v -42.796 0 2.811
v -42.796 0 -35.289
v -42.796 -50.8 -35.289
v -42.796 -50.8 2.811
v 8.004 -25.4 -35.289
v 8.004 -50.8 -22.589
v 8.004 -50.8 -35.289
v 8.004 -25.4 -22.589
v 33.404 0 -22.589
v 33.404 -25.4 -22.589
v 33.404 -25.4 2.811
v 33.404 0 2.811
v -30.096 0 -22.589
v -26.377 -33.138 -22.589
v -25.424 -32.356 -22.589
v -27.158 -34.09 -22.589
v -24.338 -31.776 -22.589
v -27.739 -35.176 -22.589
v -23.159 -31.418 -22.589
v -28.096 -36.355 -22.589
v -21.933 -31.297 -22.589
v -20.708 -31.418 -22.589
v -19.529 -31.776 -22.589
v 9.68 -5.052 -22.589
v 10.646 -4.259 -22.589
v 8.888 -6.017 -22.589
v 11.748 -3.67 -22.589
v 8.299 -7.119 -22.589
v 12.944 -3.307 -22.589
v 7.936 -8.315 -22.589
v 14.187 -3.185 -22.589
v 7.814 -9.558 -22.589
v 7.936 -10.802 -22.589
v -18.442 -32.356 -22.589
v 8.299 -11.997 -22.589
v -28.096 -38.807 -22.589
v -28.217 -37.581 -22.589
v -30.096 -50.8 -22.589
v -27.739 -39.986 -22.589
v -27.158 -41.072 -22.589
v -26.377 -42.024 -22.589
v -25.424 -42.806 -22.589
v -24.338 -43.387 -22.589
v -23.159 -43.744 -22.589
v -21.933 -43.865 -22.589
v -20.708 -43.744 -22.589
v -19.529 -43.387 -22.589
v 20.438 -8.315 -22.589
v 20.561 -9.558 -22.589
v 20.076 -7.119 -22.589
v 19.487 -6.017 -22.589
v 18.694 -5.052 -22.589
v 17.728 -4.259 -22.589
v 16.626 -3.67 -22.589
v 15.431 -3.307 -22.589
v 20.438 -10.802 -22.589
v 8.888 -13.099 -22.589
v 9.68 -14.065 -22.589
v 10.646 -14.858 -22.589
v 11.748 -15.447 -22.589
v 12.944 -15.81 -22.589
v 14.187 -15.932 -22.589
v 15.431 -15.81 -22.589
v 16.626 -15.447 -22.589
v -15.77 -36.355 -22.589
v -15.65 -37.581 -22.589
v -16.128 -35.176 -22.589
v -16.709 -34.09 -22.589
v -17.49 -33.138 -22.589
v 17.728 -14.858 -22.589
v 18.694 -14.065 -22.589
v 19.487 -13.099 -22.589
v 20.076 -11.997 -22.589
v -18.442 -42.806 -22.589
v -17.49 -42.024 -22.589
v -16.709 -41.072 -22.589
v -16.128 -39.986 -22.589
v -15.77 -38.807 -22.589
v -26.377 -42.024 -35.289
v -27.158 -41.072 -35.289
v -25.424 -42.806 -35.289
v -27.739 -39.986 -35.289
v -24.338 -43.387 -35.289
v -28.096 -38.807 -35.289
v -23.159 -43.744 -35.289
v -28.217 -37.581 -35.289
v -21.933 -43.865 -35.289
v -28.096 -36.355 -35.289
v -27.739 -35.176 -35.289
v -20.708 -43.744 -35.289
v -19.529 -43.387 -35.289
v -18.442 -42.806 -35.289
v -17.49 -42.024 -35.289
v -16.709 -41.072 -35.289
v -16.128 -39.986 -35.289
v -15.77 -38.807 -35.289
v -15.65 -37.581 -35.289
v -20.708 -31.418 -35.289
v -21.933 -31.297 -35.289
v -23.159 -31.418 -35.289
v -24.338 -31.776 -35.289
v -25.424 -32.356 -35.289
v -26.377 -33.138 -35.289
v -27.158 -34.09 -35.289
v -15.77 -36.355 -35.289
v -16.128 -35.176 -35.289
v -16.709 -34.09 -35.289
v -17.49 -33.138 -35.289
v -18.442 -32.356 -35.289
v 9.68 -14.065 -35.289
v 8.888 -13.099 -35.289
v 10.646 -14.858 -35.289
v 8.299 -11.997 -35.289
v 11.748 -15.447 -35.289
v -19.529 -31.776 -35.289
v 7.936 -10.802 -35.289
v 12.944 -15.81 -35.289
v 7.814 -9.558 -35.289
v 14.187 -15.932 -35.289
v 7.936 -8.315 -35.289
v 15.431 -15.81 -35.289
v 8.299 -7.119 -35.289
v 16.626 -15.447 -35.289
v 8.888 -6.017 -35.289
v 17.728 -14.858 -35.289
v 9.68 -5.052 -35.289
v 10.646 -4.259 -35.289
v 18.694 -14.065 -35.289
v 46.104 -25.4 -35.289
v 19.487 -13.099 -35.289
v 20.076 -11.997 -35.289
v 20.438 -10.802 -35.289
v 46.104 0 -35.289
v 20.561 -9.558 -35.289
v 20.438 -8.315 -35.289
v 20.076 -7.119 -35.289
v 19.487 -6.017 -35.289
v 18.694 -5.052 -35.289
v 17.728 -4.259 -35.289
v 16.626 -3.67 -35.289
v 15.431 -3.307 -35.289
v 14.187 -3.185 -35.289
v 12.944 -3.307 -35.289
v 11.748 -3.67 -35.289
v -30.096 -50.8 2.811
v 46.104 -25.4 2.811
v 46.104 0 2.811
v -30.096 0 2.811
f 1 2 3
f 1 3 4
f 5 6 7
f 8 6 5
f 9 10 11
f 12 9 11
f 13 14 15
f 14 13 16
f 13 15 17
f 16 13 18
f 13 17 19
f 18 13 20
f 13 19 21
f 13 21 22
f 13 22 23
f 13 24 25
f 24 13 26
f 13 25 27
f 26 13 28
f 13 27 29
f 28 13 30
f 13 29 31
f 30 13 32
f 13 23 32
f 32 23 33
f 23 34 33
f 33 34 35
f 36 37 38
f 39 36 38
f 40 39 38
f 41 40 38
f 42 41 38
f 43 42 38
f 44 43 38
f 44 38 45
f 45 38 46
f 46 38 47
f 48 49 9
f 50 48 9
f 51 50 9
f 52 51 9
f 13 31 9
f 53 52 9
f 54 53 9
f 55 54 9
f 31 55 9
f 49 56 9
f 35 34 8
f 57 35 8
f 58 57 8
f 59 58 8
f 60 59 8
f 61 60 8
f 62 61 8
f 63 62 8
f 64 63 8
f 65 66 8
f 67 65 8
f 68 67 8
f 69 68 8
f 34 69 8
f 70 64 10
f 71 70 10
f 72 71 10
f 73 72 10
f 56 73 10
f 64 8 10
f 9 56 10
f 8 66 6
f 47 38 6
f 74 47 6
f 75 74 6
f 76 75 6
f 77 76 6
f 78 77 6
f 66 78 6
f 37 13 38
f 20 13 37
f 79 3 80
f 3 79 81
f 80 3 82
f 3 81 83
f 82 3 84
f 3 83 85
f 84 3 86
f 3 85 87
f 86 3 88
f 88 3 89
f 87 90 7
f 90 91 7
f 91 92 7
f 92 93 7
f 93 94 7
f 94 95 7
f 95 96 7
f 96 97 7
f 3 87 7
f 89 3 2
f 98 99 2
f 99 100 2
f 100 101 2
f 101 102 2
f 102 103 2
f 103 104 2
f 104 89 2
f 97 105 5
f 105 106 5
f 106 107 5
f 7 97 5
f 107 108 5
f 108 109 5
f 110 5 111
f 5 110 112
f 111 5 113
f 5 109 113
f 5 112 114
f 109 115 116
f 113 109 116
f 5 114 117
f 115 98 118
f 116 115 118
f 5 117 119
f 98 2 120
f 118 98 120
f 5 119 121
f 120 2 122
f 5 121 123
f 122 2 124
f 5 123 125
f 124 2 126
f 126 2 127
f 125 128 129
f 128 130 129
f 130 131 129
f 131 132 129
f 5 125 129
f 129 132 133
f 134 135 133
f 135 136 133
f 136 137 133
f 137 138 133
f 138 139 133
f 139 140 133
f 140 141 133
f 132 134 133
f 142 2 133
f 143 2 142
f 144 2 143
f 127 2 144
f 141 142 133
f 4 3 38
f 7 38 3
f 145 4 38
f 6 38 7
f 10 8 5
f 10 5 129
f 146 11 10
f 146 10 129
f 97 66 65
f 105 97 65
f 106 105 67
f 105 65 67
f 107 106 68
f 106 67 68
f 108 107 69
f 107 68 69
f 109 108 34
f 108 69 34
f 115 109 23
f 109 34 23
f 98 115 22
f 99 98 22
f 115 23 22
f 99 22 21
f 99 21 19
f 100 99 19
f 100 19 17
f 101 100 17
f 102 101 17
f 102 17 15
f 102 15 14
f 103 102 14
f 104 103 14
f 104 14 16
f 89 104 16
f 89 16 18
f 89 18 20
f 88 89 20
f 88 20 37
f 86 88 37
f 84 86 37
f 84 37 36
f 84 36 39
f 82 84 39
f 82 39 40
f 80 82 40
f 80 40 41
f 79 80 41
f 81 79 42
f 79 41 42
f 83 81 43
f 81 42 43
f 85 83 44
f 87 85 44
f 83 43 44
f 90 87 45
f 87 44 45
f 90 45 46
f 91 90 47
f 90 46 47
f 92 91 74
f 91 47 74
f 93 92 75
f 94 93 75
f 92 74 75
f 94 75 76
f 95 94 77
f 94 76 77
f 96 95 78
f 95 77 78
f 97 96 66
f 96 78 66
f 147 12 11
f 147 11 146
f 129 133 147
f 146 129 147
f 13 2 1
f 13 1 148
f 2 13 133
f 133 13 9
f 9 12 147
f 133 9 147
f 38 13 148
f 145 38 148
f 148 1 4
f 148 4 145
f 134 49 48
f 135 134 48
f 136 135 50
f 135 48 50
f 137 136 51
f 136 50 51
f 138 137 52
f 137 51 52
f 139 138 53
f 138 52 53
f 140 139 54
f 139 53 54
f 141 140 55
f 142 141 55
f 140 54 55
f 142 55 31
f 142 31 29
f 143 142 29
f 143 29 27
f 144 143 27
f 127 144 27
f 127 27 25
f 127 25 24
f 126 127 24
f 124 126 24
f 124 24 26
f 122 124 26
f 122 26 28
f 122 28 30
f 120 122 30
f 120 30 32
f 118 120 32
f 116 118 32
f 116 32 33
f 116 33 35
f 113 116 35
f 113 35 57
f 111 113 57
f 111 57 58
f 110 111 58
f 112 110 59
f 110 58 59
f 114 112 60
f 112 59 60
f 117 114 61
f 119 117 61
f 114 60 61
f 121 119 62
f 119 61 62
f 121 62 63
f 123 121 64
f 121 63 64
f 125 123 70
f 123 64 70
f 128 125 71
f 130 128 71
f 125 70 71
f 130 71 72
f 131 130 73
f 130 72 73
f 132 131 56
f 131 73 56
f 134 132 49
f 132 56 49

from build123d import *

# Parameters (mm, degrees)
F0_W      = 88.9
F0_H      = 38.1
F1_DEPTH  = 50.8
F2_W      = 63.5
F2_H      = 25.4
F3_DEPTH  = 50.8
F4_W      = 38.1
F4_H      = 25.4
F5_DEPTH  = 38.1
F6_W      = 12.7
F6_H      = 25.4
F7_DEPTH  = 38.1
F8_R      = 6.373614
F9_DEPTH  = 25.4
F10_R     = 6.283749
F11_DEPTH = 25.4


with BuildPart() as f1:
    # F0 (on Front) → F1 (new body)
    with BuildSketch(Plane.XZ):
        with Locations((1.654342, -16.239445)):
            Rectangle(F0_W, F0_H)
    extrude(amount=F1_DEPTH)

    # F2 (on face) → F3 (cut)
    with BuildSketch(Plane.XZ.offset(50.8)):
        with Locations((1.654342, -9.889445)):
            Rectangle(F2_W, F2_H)
    extrude(amount=-F3_DEPTH, mode=Mode.SUBTRACT)

    # F4 (on face) → F5 (cut)
    with BuildSketch(Plane.XY.offset(-22.589445)):
        with Locations((27.054342, -38.1)):
            Rectangle(F4_W, F4_H)
    extrude(amount=-F5_DEPTH, mode=Mode.SUBTRACT)

    # F6 (on face) → F7 (cut)
    with BuildSketch(Plane.XY.offset(2.810555)):
        with Locations((39.754342, -38.1)):
            Rectangle(F6_W, F6_H)
    extrude(amount=-F7_DEPTH, mode=Mode.SUBTRACT)

    # F8 (on face) → F9 (cut)
    with BuildSketch(Plane.XY.offset(-22.589445)):
        with Locations((14.187237, -9.558421)):
            Circle(F8_R)
    extrude(amount=-F9_DEPTH, mode=Mode.SUBTRACT)

    # F10 (on face) → F11 (cut)
    with BuildSketch(Plane.XY.offset(-22.589445)):
        with Locations((-21.933412, -37.581116)):
            Circle(F10_R)
    extrude(amount=-F11_DEPTH, mode=Mode.SUBTRACT)


solid = f1.part
